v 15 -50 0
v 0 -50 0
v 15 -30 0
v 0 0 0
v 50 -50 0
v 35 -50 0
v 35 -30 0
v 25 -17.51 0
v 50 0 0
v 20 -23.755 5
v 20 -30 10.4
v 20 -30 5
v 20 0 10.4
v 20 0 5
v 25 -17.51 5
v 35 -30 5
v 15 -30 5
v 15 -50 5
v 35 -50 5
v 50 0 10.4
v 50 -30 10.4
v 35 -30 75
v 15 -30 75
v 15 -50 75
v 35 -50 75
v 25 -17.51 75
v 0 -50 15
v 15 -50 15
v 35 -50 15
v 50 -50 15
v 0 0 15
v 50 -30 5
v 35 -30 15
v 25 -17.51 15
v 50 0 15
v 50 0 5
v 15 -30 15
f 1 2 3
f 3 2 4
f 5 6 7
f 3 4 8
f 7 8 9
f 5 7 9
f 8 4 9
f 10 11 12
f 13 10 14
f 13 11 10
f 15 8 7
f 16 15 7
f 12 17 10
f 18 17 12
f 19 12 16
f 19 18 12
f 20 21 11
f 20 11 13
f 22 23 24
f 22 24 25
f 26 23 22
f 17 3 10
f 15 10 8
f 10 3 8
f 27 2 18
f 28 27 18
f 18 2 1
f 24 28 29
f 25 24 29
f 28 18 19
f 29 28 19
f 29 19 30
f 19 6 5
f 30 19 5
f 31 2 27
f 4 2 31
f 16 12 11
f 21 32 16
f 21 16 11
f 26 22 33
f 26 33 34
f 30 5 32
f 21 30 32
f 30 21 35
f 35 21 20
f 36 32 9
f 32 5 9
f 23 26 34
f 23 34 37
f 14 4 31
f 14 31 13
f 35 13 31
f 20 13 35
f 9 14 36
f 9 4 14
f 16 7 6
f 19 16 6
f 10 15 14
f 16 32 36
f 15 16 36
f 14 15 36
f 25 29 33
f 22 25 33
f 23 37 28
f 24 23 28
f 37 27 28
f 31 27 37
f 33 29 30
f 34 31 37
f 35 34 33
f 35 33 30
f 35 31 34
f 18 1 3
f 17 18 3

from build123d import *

# Parameters (mm, degrees)
F0_W     = 50
F0_H     = 50
F1_DEPTH = 15
F3_DEPTH = 60
F5_DEPTH = 5
F6_W     = 30
F6_H     = 5.4
F7_DEPTH = 30


with BuildPart() as f1:
    # F0 (on Top) → F1 (new body)
    with BuildSketch(Plane.XY):
        with Locations((25, -25)):
            Rectangle(F0_W, F0_H)
    extrude(amount=F1_DEPTH)

    # F2 (on face) → F3 (join)
    with BuildSketch(Plane.XY.offset(15)):
        Polygon((15, -30), (15, -50), (35, -50), (35, -30), (25, -17.510004), align=None)
    extrude(amount=F3_DEPTH)

    # F4 (on face) → F5 (cut)
    with BuildSketch(Plane(origin=(0, 0, 0), x_dir=(1, 0, 0), z_dir=(0, 0, -1))):
        Polygon((35, 50), (15, 50), (15, 30), (25, 17.510004), (35, 30), align=None)
    extrude(amount=-F5_DEPTH, mode=Mode.SUBTRACT)

    # F6 (on face) → F7 (cut)
    with BuildSketch(Plane.YZ.offset(50)):
        with Locations((-15, 7.7)):
            Rectangle(F6_W, F6_H)
    extrude(amount=-F7_DEPTH, mode=Mode.SUBTRACT)


solid = f1.part
